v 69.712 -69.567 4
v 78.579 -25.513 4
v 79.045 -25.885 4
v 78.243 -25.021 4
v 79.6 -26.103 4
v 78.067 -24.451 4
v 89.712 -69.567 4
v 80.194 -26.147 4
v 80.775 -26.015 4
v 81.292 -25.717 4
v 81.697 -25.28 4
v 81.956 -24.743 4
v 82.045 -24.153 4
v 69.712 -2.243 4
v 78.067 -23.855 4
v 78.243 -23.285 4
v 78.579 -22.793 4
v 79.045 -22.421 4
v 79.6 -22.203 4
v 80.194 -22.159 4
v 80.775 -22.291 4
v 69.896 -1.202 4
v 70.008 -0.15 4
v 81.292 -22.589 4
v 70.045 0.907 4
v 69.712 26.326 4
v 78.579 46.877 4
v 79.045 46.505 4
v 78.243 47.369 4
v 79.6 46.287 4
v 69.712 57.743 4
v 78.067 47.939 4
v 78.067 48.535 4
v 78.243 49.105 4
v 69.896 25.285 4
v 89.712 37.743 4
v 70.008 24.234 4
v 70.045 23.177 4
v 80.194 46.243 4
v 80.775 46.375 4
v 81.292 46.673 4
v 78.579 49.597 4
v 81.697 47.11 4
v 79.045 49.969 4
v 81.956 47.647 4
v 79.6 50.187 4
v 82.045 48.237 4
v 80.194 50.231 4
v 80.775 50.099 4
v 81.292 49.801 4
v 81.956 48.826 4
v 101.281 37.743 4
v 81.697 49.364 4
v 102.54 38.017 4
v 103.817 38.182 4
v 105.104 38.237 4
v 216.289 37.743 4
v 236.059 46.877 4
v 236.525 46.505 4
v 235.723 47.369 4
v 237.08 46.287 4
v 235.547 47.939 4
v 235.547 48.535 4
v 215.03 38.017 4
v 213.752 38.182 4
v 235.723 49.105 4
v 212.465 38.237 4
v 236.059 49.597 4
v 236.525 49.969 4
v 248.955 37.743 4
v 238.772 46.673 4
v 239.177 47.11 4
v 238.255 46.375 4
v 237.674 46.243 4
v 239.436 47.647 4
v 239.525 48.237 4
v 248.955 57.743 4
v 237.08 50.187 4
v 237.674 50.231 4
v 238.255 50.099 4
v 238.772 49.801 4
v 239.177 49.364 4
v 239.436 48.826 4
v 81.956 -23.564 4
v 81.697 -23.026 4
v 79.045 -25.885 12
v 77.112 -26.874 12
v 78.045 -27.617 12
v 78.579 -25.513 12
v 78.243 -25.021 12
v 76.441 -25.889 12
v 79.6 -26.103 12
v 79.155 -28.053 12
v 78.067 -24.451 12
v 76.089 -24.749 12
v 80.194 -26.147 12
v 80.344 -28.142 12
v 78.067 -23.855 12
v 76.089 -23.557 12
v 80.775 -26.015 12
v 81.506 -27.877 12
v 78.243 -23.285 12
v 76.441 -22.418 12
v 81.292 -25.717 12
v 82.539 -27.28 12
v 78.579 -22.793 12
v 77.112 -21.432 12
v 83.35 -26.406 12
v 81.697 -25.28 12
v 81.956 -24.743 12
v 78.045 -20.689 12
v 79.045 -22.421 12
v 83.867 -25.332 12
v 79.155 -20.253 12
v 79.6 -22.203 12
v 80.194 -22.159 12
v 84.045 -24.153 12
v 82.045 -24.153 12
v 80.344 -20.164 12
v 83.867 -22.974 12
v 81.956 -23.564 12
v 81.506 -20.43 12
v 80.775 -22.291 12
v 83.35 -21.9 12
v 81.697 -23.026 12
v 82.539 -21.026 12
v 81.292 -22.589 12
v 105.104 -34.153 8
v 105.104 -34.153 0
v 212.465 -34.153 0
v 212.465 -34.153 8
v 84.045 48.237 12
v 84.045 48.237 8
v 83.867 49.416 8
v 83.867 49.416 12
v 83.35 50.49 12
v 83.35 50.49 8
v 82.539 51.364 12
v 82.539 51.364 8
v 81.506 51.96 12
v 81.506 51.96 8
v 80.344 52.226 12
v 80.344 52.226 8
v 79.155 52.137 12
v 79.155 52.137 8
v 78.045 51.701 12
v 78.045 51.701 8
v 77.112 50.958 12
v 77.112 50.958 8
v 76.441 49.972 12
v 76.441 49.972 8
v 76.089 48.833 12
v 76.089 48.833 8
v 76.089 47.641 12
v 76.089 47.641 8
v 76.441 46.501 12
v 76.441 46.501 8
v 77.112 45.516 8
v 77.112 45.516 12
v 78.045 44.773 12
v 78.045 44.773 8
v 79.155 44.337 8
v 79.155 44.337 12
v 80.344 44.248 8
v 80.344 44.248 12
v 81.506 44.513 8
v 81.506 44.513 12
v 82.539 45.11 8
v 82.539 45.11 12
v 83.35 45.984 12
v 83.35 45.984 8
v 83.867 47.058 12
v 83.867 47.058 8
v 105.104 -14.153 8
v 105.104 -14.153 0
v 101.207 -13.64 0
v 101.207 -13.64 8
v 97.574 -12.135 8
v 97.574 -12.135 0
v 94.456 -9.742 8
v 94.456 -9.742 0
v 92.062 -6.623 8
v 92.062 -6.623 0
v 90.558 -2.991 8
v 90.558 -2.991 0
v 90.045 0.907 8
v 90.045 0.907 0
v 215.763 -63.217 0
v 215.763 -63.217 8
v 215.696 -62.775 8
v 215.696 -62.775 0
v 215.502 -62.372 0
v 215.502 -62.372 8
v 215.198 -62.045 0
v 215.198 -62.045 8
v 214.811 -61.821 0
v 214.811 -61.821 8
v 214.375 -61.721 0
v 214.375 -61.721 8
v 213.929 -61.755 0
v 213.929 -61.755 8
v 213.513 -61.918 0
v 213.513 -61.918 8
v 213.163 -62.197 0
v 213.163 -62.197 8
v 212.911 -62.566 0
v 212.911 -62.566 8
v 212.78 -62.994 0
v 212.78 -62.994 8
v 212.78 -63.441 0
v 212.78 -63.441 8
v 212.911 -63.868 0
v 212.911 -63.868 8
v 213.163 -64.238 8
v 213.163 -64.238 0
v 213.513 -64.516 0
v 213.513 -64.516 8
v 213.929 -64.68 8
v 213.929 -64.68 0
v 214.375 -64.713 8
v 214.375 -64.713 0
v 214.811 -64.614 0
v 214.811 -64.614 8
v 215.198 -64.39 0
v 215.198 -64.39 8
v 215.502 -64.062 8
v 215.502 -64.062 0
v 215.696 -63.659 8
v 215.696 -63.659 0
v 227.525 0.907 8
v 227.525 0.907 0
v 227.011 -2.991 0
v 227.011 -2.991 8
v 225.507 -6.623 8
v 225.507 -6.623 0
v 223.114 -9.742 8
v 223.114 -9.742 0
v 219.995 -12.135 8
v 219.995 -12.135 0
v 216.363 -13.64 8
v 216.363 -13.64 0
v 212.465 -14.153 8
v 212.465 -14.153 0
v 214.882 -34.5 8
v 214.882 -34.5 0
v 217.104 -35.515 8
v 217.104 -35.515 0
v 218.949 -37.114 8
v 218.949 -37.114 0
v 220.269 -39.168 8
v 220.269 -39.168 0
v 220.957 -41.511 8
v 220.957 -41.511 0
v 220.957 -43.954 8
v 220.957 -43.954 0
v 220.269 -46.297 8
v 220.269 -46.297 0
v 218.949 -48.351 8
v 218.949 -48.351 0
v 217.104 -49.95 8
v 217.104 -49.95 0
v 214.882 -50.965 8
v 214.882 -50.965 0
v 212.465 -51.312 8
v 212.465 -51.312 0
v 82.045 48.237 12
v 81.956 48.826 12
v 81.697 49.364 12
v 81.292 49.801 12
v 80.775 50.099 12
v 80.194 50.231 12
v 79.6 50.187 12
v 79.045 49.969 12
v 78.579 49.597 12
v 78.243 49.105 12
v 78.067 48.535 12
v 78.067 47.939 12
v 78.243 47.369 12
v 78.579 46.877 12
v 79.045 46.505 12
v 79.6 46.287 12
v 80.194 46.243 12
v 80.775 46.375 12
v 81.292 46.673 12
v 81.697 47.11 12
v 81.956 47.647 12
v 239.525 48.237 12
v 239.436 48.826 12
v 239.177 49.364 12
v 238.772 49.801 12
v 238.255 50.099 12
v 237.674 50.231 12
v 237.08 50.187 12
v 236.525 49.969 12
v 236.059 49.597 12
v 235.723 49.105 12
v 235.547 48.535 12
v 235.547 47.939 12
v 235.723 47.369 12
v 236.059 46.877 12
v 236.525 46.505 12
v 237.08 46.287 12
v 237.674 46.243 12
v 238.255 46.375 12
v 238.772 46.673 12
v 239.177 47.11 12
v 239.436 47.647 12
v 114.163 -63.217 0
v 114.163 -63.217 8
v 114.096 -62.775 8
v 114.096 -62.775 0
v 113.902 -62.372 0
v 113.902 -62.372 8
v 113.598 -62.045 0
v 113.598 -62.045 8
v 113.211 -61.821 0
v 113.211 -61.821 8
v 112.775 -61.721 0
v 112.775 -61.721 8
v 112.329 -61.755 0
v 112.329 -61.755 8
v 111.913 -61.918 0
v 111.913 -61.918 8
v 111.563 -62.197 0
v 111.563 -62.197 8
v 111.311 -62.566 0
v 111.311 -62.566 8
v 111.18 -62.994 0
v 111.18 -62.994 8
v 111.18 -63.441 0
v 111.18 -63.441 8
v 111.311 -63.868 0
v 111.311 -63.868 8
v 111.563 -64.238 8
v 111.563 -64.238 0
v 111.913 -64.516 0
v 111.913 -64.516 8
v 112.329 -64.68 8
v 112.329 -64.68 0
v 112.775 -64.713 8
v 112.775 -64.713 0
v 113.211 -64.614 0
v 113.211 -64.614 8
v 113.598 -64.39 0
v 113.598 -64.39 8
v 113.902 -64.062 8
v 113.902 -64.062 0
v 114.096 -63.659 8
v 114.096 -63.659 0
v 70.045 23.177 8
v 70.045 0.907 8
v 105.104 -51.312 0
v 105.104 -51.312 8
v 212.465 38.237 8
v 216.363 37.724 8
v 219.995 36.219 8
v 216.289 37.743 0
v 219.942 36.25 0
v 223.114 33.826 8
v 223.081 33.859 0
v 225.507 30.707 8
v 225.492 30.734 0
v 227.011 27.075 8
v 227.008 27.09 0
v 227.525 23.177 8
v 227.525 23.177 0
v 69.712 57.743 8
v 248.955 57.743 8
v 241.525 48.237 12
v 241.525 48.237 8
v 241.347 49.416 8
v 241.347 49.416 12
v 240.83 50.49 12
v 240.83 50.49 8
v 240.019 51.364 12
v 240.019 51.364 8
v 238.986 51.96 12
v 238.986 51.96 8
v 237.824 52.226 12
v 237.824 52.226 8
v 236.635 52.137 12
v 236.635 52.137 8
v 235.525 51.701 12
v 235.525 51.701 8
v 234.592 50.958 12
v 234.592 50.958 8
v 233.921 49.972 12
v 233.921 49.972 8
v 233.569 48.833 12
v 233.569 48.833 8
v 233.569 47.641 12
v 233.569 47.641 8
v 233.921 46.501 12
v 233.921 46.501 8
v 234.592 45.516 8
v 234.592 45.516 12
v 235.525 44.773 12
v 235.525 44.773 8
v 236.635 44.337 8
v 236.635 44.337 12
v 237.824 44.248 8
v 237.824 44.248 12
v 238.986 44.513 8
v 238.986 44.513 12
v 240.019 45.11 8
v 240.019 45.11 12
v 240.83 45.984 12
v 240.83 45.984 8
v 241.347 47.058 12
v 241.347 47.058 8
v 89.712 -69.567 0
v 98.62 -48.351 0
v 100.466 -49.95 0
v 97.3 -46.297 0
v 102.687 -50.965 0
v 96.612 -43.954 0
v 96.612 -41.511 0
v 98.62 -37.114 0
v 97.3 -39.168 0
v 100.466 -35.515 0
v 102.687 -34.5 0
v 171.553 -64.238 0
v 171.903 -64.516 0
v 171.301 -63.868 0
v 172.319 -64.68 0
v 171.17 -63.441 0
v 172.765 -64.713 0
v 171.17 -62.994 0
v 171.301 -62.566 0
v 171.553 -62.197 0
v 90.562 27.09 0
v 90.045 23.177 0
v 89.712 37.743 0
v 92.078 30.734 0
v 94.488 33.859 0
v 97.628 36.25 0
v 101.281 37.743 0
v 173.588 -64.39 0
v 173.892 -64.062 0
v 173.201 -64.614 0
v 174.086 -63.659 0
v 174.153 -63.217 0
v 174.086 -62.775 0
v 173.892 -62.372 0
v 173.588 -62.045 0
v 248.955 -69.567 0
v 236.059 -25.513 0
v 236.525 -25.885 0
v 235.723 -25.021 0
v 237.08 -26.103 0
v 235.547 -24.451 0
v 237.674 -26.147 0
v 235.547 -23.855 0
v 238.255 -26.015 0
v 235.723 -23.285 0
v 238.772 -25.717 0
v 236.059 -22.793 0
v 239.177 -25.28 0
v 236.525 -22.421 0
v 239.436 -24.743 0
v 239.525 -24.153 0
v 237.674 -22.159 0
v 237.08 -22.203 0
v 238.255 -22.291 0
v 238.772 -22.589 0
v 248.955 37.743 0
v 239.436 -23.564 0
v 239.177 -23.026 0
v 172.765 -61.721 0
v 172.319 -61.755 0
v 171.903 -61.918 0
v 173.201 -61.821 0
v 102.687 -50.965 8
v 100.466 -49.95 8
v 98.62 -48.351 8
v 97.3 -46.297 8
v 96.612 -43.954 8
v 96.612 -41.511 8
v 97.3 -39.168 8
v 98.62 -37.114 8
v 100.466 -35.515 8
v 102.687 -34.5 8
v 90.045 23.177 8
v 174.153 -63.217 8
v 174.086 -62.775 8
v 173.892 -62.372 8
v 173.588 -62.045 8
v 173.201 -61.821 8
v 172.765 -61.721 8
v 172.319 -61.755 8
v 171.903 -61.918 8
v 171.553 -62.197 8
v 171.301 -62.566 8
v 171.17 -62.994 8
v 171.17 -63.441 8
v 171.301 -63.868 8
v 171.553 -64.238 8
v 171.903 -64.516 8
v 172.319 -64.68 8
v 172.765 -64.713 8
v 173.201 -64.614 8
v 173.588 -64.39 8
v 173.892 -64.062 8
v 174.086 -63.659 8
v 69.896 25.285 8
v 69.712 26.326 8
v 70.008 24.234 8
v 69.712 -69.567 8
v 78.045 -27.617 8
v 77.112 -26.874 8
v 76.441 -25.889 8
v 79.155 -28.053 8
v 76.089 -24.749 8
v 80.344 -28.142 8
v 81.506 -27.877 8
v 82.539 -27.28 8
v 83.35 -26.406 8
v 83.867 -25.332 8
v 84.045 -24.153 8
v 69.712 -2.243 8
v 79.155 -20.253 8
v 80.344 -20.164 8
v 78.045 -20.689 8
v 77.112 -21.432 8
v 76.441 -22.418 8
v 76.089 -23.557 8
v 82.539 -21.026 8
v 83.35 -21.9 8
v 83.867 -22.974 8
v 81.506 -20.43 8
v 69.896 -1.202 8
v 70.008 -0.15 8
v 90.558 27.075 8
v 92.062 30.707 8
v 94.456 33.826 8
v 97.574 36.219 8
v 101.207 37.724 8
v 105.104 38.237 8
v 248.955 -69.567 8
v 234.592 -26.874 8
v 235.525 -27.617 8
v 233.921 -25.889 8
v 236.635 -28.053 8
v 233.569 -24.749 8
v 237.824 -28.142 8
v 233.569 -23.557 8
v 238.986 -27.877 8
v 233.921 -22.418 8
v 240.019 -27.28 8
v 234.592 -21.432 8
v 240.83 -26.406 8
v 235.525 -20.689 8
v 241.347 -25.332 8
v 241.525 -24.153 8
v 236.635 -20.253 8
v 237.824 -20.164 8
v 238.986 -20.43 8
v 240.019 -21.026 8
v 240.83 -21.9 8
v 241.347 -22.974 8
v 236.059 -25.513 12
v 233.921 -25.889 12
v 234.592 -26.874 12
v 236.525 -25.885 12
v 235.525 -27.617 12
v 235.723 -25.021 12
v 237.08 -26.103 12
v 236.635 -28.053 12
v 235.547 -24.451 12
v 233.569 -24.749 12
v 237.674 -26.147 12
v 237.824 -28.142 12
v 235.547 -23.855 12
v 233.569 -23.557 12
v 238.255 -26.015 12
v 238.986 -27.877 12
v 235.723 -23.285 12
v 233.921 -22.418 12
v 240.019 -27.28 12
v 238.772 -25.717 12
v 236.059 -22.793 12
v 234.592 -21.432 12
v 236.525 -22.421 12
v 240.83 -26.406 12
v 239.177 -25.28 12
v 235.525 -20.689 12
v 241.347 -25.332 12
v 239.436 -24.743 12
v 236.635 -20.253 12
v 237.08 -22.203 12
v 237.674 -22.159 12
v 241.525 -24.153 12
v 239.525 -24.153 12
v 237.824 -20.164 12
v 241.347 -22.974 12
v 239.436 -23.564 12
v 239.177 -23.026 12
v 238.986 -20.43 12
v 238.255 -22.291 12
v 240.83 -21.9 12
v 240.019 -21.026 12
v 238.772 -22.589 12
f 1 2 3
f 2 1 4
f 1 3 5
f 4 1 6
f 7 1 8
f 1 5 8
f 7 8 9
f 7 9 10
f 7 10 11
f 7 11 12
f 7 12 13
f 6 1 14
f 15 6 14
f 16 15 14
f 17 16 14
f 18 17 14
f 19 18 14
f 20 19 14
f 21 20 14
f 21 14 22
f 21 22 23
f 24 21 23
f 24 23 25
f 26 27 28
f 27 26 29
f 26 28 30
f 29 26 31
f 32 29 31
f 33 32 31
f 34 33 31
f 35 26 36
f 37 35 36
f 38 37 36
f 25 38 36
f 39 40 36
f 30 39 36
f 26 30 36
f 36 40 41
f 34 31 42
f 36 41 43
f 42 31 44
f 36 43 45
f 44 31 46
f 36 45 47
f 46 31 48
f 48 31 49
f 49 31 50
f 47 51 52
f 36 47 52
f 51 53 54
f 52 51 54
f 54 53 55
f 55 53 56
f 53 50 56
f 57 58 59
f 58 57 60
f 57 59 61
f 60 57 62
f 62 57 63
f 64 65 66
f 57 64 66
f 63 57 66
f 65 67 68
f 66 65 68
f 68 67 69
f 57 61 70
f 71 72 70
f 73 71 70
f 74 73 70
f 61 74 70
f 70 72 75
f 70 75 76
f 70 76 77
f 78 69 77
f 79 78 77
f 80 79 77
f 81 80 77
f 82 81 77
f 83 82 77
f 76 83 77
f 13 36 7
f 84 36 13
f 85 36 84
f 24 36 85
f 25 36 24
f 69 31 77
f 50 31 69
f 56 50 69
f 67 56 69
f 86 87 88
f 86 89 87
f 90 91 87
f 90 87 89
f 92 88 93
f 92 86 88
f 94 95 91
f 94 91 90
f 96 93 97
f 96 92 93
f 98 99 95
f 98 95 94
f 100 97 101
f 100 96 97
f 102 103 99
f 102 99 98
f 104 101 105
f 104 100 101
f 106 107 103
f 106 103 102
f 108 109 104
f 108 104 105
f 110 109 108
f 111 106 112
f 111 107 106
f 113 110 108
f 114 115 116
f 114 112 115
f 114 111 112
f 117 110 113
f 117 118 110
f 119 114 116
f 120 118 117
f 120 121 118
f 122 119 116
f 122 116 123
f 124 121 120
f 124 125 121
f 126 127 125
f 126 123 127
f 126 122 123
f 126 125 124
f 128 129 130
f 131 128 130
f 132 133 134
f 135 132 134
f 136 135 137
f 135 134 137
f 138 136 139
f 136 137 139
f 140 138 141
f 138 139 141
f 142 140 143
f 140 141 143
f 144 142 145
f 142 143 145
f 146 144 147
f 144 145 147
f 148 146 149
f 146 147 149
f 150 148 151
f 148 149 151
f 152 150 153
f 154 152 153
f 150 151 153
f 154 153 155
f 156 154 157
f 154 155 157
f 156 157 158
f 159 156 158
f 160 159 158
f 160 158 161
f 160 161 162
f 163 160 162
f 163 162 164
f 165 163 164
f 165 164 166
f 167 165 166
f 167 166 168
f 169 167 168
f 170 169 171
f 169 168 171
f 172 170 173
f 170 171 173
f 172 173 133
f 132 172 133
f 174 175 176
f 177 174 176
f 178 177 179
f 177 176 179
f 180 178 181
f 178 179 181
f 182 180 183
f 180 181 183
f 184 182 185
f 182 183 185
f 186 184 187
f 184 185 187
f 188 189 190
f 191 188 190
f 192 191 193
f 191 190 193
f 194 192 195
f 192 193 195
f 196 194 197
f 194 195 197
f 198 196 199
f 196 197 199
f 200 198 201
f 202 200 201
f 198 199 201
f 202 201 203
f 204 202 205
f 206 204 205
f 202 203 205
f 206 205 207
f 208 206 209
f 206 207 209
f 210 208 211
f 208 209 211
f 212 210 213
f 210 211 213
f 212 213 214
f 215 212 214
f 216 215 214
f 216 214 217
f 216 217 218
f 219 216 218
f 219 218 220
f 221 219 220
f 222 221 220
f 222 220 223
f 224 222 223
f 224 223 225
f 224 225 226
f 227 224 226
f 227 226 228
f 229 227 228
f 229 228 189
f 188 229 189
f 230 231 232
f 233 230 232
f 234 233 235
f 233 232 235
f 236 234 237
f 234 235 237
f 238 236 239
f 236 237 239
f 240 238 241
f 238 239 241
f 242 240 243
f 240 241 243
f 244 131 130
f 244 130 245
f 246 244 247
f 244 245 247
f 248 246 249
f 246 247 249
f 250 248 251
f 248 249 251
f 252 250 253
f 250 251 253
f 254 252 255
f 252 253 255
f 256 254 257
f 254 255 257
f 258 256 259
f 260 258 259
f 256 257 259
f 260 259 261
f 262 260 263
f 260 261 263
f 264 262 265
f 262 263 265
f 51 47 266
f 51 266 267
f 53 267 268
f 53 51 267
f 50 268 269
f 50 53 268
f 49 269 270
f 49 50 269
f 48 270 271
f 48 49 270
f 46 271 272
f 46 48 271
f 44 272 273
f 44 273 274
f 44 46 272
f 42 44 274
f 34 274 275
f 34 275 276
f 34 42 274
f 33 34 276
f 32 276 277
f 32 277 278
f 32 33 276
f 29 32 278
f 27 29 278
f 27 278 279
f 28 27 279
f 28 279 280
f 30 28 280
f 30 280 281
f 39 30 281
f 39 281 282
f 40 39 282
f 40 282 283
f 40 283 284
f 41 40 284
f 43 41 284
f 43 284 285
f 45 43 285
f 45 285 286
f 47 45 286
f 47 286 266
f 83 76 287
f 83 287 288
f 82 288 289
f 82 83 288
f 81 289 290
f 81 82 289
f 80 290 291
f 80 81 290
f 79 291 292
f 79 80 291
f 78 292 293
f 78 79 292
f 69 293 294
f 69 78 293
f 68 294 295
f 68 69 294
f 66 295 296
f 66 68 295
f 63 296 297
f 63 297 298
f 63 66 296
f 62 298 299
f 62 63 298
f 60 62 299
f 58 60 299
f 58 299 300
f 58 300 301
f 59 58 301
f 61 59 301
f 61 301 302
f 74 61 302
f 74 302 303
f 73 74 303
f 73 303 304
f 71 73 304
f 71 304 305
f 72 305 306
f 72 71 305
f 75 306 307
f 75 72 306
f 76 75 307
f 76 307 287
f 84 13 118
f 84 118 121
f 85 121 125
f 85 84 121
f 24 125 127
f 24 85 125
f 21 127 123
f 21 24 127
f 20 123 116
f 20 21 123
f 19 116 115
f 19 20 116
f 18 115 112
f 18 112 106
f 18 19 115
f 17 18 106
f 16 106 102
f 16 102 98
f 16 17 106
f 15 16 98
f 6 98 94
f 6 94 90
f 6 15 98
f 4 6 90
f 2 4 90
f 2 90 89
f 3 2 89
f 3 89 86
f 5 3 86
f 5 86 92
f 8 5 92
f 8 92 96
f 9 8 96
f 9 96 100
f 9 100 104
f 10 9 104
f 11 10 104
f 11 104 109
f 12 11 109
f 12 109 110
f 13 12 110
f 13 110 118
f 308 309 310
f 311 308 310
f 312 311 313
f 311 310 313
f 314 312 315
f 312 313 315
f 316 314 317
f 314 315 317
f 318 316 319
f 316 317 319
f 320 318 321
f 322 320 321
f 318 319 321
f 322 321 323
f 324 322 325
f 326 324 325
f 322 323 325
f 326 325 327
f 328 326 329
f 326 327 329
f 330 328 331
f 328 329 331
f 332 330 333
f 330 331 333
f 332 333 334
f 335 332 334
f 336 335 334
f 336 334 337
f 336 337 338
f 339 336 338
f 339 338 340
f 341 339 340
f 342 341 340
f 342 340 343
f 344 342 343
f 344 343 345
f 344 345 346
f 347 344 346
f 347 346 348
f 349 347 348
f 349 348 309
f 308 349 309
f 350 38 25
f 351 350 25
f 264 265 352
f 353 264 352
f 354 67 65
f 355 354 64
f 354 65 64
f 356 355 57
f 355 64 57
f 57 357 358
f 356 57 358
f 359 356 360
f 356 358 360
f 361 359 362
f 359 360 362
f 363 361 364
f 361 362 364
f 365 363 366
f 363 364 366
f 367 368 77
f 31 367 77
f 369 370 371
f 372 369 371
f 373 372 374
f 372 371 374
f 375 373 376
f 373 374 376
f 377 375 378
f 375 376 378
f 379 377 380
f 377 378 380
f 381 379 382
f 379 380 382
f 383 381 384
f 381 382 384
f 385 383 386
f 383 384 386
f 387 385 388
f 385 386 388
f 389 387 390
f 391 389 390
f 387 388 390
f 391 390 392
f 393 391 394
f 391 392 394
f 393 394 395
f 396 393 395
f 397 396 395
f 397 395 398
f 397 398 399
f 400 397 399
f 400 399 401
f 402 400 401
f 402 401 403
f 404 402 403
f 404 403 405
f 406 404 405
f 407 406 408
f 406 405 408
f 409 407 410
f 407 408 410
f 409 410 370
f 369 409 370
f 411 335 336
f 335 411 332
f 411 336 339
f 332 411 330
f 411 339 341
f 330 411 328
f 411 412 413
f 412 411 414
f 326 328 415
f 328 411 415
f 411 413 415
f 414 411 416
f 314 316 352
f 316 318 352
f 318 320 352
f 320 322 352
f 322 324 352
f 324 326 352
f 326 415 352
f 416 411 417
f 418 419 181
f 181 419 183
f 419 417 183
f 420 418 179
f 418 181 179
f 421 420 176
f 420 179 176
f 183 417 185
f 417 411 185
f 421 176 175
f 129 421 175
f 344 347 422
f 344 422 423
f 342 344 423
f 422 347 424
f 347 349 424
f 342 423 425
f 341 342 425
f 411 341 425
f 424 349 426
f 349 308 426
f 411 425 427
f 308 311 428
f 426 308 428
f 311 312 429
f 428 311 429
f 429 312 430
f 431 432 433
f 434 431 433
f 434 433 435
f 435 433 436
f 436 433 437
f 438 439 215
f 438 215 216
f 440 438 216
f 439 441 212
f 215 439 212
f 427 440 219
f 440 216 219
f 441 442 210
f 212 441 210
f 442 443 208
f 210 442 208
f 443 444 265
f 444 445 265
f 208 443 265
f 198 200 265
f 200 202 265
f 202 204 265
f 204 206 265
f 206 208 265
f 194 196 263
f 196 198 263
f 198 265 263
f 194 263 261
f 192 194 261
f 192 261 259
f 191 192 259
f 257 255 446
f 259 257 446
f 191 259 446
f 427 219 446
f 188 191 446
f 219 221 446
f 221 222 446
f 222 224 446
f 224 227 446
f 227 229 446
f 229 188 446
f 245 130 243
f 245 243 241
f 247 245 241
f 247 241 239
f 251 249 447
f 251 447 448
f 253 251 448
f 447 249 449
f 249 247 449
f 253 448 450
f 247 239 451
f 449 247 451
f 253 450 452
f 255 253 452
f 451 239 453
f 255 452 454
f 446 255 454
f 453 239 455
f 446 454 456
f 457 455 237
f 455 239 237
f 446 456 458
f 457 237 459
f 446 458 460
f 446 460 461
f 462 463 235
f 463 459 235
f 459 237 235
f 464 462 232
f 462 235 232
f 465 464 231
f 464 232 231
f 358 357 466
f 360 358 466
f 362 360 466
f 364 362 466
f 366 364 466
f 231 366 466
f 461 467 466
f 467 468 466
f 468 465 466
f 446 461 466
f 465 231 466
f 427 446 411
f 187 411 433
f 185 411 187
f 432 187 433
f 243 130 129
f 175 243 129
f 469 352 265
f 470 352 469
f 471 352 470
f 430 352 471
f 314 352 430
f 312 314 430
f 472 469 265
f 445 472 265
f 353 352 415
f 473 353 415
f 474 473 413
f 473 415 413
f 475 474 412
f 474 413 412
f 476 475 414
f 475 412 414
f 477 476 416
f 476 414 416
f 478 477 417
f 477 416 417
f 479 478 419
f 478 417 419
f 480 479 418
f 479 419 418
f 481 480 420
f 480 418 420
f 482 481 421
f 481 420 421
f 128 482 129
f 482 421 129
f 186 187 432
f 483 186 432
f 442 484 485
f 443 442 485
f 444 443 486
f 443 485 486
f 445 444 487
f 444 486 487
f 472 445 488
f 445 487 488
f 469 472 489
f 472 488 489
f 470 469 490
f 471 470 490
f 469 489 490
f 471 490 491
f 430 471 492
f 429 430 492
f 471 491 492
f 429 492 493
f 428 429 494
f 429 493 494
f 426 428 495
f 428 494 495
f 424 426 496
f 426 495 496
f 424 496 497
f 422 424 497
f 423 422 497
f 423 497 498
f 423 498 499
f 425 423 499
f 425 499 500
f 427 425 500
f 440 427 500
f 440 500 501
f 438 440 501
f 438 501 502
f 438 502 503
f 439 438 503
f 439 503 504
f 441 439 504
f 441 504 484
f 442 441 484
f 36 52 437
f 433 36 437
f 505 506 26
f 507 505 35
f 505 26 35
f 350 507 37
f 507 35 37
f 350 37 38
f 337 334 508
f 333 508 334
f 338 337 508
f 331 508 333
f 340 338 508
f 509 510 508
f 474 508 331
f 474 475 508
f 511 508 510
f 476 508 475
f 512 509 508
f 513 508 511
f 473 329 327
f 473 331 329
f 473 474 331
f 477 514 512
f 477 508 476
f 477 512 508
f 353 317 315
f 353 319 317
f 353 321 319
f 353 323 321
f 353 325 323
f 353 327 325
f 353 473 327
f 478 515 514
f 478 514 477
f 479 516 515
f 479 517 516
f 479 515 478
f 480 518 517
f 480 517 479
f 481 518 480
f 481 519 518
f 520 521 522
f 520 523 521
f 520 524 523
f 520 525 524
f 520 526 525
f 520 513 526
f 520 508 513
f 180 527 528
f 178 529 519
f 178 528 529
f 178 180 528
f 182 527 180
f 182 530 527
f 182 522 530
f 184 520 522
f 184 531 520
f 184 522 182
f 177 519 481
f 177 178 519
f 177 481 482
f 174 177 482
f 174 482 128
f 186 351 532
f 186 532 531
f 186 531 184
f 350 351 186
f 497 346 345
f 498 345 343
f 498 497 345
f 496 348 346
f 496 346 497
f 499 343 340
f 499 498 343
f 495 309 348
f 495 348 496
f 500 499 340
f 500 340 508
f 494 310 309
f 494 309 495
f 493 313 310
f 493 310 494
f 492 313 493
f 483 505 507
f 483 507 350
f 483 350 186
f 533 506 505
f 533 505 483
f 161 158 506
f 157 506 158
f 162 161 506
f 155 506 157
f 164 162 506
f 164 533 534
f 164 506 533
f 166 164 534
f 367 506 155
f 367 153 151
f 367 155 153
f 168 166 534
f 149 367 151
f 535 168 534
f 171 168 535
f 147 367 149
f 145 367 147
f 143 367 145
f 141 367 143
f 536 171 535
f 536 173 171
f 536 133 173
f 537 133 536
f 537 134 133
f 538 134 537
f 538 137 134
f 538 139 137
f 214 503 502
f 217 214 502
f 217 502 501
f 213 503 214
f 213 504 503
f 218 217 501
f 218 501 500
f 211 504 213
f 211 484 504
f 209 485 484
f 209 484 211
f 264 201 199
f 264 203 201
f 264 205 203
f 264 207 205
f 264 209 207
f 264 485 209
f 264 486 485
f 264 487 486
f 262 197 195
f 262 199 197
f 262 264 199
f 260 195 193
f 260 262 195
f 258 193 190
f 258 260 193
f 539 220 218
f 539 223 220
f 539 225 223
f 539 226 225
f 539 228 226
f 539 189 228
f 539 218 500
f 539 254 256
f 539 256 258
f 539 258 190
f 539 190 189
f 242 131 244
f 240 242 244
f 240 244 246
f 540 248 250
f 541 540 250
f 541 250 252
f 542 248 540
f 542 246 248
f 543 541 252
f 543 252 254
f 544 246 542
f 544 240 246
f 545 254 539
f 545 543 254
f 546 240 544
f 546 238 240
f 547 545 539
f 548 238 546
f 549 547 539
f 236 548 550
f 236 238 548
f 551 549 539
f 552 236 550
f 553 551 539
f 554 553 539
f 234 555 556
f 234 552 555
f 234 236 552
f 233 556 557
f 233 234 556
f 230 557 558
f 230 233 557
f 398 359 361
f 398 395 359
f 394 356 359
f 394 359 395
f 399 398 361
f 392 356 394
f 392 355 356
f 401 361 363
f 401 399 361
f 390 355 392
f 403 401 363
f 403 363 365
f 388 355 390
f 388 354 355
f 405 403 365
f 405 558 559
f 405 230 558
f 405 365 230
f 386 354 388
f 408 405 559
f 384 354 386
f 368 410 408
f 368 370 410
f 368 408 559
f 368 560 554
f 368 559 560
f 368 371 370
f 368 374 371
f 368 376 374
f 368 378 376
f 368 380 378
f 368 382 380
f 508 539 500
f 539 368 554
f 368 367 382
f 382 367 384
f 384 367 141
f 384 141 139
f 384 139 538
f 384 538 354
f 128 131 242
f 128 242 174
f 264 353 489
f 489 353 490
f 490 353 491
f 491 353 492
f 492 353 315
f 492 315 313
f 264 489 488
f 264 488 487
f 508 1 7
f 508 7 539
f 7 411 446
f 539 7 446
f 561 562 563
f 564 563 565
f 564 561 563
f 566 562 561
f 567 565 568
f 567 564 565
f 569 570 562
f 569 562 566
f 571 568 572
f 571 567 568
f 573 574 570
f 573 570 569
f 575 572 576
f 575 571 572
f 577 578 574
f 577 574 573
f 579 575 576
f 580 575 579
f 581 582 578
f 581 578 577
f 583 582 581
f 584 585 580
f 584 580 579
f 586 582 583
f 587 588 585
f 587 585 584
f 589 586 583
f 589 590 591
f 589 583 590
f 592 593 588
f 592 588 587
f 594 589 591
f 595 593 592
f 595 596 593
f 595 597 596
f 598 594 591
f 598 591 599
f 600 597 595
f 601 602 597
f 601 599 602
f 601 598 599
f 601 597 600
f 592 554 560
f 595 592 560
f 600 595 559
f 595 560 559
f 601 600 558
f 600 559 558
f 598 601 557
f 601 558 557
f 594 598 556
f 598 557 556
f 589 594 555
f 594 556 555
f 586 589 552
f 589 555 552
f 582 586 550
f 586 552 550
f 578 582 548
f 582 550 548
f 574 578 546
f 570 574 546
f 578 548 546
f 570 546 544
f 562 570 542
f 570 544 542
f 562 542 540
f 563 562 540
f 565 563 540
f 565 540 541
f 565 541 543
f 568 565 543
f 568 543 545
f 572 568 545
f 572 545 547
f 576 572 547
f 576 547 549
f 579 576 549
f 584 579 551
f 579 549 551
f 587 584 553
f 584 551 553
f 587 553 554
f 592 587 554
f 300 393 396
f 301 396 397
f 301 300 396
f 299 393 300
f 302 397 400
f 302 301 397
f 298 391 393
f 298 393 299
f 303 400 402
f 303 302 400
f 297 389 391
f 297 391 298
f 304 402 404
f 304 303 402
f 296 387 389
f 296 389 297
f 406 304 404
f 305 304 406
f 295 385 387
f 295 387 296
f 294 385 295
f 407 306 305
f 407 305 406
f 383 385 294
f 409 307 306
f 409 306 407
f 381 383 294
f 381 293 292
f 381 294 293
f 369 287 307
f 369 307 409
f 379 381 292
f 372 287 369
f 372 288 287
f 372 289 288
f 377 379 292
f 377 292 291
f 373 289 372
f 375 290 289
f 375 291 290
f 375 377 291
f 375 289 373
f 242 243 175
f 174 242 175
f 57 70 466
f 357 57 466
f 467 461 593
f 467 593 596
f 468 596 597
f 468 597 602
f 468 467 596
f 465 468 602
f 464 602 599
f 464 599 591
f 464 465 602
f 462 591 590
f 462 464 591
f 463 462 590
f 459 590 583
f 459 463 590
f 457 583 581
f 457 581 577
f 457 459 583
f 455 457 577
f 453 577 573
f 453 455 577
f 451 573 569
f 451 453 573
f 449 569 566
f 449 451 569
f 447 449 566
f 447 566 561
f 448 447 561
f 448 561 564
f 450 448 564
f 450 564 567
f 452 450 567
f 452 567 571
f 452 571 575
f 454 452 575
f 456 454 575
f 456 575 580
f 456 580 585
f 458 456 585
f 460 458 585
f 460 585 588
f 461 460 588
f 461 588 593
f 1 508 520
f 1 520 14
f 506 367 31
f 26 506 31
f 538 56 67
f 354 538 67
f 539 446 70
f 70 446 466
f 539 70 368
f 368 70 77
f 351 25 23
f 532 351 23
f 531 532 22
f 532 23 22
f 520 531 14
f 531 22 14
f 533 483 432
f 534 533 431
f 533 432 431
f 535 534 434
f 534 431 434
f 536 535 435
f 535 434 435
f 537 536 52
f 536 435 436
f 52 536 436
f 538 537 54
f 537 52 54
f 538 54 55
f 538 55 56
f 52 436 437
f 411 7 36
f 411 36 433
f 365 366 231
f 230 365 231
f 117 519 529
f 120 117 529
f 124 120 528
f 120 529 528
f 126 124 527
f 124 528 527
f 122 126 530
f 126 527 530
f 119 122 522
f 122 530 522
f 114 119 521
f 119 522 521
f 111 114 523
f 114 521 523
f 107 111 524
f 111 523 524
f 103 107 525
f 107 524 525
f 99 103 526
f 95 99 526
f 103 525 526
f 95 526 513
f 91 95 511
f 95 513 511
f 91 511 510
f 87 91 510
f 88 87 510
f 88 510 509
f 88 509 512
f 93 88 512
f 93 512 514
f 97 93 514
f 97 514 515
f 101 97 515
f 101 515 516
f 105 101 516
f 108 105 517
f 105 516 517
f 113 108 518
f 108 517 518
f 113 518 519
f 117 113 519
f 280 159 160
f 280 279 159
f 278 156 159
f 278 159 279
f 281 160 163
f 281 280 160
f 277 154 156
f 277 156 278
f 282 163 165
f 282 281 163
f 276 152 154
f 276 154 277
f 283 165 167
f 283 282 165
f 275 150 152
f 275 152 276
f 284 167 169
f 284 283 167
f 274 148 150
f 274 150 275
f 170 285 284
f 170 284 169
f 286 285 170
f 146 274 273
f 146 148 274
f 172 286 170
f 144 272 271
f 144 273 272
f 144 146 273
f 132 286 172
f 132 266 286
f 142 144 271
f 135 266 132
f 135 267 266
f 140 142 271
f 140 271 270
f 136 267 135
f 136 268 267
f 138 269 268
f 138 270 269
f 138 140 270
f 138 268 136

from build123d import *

# Parameters (mm, degrees)
F0_R      = 2
F1_DEPTH  = 8
F3_DEPTH  = 185
F5_DEPTH  = 5
F6_R      = 2.5
F7_DEPTH  = 5
F8_R      = 2.012254
F9_DEPTH  = 3
F10_R     = 4
F10_R_2   = 2
F11_DEPTH = 4
F13_DEPTH = 340
F15_DEPTH = 320
F16_R     = 1.5
F17_DEPTH = 25


with BuildPart() as f1:
    # F0 (on Top) → F1 (new body)
    with BuildSketch(Plane.XY):
        Polygon((248.954639, 211.431908), (-84.845372, 211.431908), (-84.845372, -69.567305), (248.954639, -69.567305), (248.954639, -32.408092), align=None)
        with Locations((-44.415361, -24.153092)):
            Circle(F0_R, mode=Mode.SUBTRACT)
        with BuildLine():
            Line((-54.415363, 33.177276), (-54.415363, -42.732489))
            ThreePointArc((-54.415363, -42.732489), (-60.347495, -48.664621), (-66.279627, -42.732489))
            Line((-66.279627, -42.732489), (-66.279627, 33.177276))
            ThreePointArc((-66.279627, 33.177276), (-60.347495, 39.109408), (-54.415363, 33.177276))
        make_face(mode=Mode.SUBTRACT)
        with BuildLine():
            Line((-19.355729, -34.152674), (54.985007, -34.152674))
            ThreePointArc((54.985007, -34.152674), (63.564824, -42.732488), (54.98501, -51.312305))
            Line((54.98501, -51.312305), (-19.355726, -51.312305))
            ThreePointArc((-19.355726, -51.312305), (-27.935546, -42.732491), (-19.355729, -34.152674))
        make_face(mode=Mode.SUBTRACT)
        with Locations((80.044639, -24.153092)):
            Circle(F0_R, mode=Mode.SUBTRACT)
        with Locations((-44.415361, 48.236908)):
            Circle(F0_R, mode=Mode.SUBTRACT)
        with BuildLine():
            ThreePointArc((-34.415361, 23.177276), (-30.004497, 33.826044), (-19.355729, 38.236908))
            Line((-19.355729, 38.236908), (54.985007, 38.236908))
            ThreePointArc((54.985007, 38.236908), (65.633775, 33.826044), (70.044639, 23.177276))
            Line((70.044639, 23.177276), (70.044639, 0.90654))
            ThreePointArc((70.044639, 0.90654), (65.633775, -9.742228), (54.985007, -14.153092))
            Line((54.985007, -14.153092), (-19.355729, -14.153092))
            ThreePointArc((-19.355729, -14.153092), (-30.004497, -9.742228), (-34.415361, 0.90654))
            Line((-34.415361, 0.90654), (-34.415361, 23.177276))
        make_face(mode=Mode.SUBTRACT)
        with Locations((80.044639, 48.236908)):
            Circle(F0_R, mode=Mode.SUBTRACT)
        with BuildLine():
            ThreePointArc((212.465007, -34.152674), (221.044824, -42.732488), (212.46501, -51.312305))
            Line((212.46501, -51.312305), (105.104274, -51.312305))
            ThreePointArc((105.104274, -51.312305), (96.524457, -42.732491), (105.104271, -34.152674))
            Line((105.104271, -34.152674), (212.465007, -34.152674))
        make_face(mode=Mode.SUBTRACT)
        with Locations((237.524639, -24.153092)):
            Circle(F0_R, mode=Mode.SUBTRACT)
        with BuildLine():
            Line((90.044639, 0.90654), (90.044639, 23.177276))
            ThreePointArc((90.044639, 23.177276), (94.455503, 33.826044), (105.104271, 38.236908))
            Line((105.104271, 38.236908), (212.465007, 38.236908))
            ThreePointArc((212.465007, 38.236908), (223.113775, 33.826044), (227.524639, 23.177276))
            Line((227.524639, 23.177276), (227.524639, 0.90654))
            ThreePointArc((227.524639, 0.90654), (223.113775, -9.742228), (212.465007, -14.153092))
            Line((212.465007, -14.153092), (105.104271, -14.153092))
            ThreePointArc((105.104271, -14.153092), (94.455503, -9.742228), (90.044639, 0.90654))
        make_face(mode=Mode.SUBTRACT)
        with Locations((237.524639, 48.236908)):
            Circle(F0_R, mode=Mode.SUBTRACT)
        with BuildLine():
            Line((-54.415363, 180.316908), (-54.415363, 63.29654))
            ThreePointArc((-54.415363, 63.29654), (-60.347495, 57.364408), (-66.279627, 63.29654))
            Line((-66.279627, 63.29654), (-66.279627, 180.316908))
            ThreePointArc((-66.279627, 180.316908), (-60.347495, 186.24904), (-54.415363, 180.316908))
        make_face(mode=Mode.SUBTRACT)
        with BuildLine():
            Line((-34.415361, 73.29654), (-34.415361, 178.117276))
            ThreePointArc((-34.415361, 178.117276), (-30.004497, 188.766044), (-19.355729, 193.176908))
            Line((-19.355729, 193.176908), (54.985007, 193.176908))
            ThreePointArc((54.985007, 193.176908), (65.633775, 188.766044), (70.044639, 178.117276))
            Line((70.044639, 178.117276), (70.044639, 73.29654))
            ThreePointArc((70.044639, 73.29654), (65.633775, 62.647772), (54.985007, 58.236908))
            Line((54.985007, 58.236908), (-19.355729, 58.236908))
            ThreePointArc((-19.355729, 58.236908), (-30.004497, 62.647772), (-34.415361, 73.29654))
        make_face(mode=Mode.SUBTRACT)
        with Locations((-44.415361, 203.176908)):
            Circle(F0_R, mode=Mode.SUBTRACT)
        with Locations((80.044639, 203.176908)):
            Circle(F0_R, mode=Mode.SUBTRACT)
        with BuildLine():
            ThreePointArc((227.524639, 73.29654), (223.113775, 62.647772), (212.465007, 58.236908))
            Line((212.465007, 58.236908), (105.104271, 58.236908))
            ThreePointArc((105.104271, 58.236908), (94.455503, 62.647772), (90.044639, 73.29654))
            Line((90.044639, 73.29654), (90.044639, 178.117276))
            ThreePointArc((90.044639, 178.117276), (94.455503, 188.766044), (105.104271, 193.176908))
            Line((105.104271, 193.176908), (212.465007, 193.176908))
            Line((212.465007, 193.176908), (212.465007, 170.316908))
            ThreePointArc((212.465007, 170.316908), (223.113775, 165.906044), (227.524639, 155.257276))
            Line((227.524639, 155.257276), (227.524639, 73.29654))
        make_face(mode=Mode.SUBTRACT)
        with Locations((237.524639, 180.316908)):
            Circle(F0_R, mode=Mode.SUBTRACT)
    extrude(amount=F1_DEPTH)

    # F2 (on face) → F3 (join)
    with BuildSketch(Plane.XY.offset(8)):
        Polygon((15.154628, 211.431908), (-84.845372, 211.431908), (-84.845372, 71.431908), (-81.845372, 71.431908), (-81.845372, 208.431908), (15.154628, 208.431908), align=None)
    extrude(amount=F3_DEPTH)

    # F4 (on face) → F5 (cut)
    with BuildSketch(Plane(origin=(-84.845372, 0, 0), x_dir=(0, -1, 0), z_dir=(-1, 0, 0))):
        Polygon((-169.016169, 40), (-201.431908, 143.553324), (-201.431908, 40), align=None)
        Polygon((-71.431908, 193), (-206.431908, 193), (-158.537665, 40), (-71.431908, 40), align=None)
    extrude(amount=-F5_DEPTH, mode=Mode.SUBTRACT)

    # F6 (on face) → F7 (cut)
    with BuildSketch(Plane(origin=(0, 211.431908, 0), x_dir=(-1, 0, 0), z_dir=(0, 1, 0))):
        Polygon((12.845372, 83.034229), (12.845372, 55.132884), (75.345372, 55.132884), (75.345372, 148.132884), (67.845372, 148.132884), (67.845372, 178.132884), (2.845372, 178.132884), (1.345372, 83.215967), align=None)
        with Locations((11.345372, 185.632884)):
            Circle(F6_R)
        with Locations((1.345372, 185.632884)):
            Circle(F6_R)
        with Locations((75.345372, 161.632884)):
            Circle(F6_R)
        with Locations((75.345372, 185.632884)):
            Circle(F6_R)
        with Locations((75.345372, 47.632884)):
            Circle(F6_R)
        with Locations((65.345372, 47.632884)):
            Circle(F6_R)
        with Locations((1.345372, 47.632884)):
            Circle(F6_R)
        with Locations((1.345372, 71.632884)):
            Circle(F6_R)
    extrude(amount=-F7_DEPTH, mode=Mode.SUBTRACT)

    # F8 (on face) → F9 (join)
    with BuildSketch(Plane.XY.offset(40)):
        Polygon((14.154628, 208.488166), (-81.845372, 208.488166), (-81.845372, 201.431908), (-81.845372, 169.016169), (-81.845372, 71.523808), align=None)
        Polygon((-71.845372, 103.213636), (-71.845372, 198.488166), (-5.066284, 198.488166), align=None, mode=Mode.SUBTRACT)
        with Locations((-44.408604, 203.142822)):
            Circle(F8_R, mode=Mode.SUBTRACT)
    extrude(amount=-F9_DEPTH)

    # F10 (on face) → F11 (join)
    with BuildSketch(Plane.XY.offset(8)):
        with Locations((237.524639, 48.236908)):
            Circle(F10_R)
        with Locations((237.524639, 48.236908)):
            Circle(F10_R_2, mode=Mode.SUBTRACT)
        with Locations((237.524639, -24.153092)):
            Circle(F10_R)
        with Locations((237.524639, -24.153092)):
            Circle(F10_R_2, mode=Mode.SUBTRACT)
        with Locations((80.044639, 48.236908)):
            Circle(F10_R)
        with Locations((80.044639, 48.236908)):
            Circle(F10_R_2, mode=Mode.SUBTRACT)
        with Locations((80.044639, -24.153092)):
            Circle(F10_R)
        with Locations((80.044639, -24.153092)):
            Circle(F10_R_2, mode=Mode.SUBTRACT)
    extrude(amount=F11_DEPTH)

    # F12 (on face) → F13 (cut)
    with BuildSketch(Plane.YZ.offset(248.954639)):
        Polygon((57.743425, 4), (37.743425, 4), (37.743425, 0), (211.431908, 0), (211.431908, 8), (57.743425, 8), align=None)
    extrude(amount=-F13_DEPTH, mode=Mode.SUBTRACT)

    # F14 (on face) → F15 (cut)
    with BuildSketch(Plane(origin=(0, 211.431908, 0), x_dir=(-1, 0, 0), z_dir=(0, 1, 0))):
        Polygon((-69.711687, 8), (-69.711687, 4), (-89.711687, 4), (-89.711687, 0), (-20.75227, 0), (93.97424, 0), (93.97424, 17.639369), (93.97424, 194.899216), (-20.75227, 194.899216), (-20.75227, 10.883192), align=None)
    extrude(amount=-F15_DEPTH, mode=Mode.SUBTRACT)

    # F16 (on face) → F17 (cut)
    with BuildSketch(Plane.XY.offset(8)):
        with Locations((214.26287, -63.217305)):
            Circle(F16_R)
        with Locations((112.66287, -63.217305)):
            Circle(F16_R)
        with Locations((172.65287, -63.217305)):
            Circle(F16_R)
    extrude(amount=-F17_DEPTH, mode=Mode.SUBTRACT)


solid = f1.part
